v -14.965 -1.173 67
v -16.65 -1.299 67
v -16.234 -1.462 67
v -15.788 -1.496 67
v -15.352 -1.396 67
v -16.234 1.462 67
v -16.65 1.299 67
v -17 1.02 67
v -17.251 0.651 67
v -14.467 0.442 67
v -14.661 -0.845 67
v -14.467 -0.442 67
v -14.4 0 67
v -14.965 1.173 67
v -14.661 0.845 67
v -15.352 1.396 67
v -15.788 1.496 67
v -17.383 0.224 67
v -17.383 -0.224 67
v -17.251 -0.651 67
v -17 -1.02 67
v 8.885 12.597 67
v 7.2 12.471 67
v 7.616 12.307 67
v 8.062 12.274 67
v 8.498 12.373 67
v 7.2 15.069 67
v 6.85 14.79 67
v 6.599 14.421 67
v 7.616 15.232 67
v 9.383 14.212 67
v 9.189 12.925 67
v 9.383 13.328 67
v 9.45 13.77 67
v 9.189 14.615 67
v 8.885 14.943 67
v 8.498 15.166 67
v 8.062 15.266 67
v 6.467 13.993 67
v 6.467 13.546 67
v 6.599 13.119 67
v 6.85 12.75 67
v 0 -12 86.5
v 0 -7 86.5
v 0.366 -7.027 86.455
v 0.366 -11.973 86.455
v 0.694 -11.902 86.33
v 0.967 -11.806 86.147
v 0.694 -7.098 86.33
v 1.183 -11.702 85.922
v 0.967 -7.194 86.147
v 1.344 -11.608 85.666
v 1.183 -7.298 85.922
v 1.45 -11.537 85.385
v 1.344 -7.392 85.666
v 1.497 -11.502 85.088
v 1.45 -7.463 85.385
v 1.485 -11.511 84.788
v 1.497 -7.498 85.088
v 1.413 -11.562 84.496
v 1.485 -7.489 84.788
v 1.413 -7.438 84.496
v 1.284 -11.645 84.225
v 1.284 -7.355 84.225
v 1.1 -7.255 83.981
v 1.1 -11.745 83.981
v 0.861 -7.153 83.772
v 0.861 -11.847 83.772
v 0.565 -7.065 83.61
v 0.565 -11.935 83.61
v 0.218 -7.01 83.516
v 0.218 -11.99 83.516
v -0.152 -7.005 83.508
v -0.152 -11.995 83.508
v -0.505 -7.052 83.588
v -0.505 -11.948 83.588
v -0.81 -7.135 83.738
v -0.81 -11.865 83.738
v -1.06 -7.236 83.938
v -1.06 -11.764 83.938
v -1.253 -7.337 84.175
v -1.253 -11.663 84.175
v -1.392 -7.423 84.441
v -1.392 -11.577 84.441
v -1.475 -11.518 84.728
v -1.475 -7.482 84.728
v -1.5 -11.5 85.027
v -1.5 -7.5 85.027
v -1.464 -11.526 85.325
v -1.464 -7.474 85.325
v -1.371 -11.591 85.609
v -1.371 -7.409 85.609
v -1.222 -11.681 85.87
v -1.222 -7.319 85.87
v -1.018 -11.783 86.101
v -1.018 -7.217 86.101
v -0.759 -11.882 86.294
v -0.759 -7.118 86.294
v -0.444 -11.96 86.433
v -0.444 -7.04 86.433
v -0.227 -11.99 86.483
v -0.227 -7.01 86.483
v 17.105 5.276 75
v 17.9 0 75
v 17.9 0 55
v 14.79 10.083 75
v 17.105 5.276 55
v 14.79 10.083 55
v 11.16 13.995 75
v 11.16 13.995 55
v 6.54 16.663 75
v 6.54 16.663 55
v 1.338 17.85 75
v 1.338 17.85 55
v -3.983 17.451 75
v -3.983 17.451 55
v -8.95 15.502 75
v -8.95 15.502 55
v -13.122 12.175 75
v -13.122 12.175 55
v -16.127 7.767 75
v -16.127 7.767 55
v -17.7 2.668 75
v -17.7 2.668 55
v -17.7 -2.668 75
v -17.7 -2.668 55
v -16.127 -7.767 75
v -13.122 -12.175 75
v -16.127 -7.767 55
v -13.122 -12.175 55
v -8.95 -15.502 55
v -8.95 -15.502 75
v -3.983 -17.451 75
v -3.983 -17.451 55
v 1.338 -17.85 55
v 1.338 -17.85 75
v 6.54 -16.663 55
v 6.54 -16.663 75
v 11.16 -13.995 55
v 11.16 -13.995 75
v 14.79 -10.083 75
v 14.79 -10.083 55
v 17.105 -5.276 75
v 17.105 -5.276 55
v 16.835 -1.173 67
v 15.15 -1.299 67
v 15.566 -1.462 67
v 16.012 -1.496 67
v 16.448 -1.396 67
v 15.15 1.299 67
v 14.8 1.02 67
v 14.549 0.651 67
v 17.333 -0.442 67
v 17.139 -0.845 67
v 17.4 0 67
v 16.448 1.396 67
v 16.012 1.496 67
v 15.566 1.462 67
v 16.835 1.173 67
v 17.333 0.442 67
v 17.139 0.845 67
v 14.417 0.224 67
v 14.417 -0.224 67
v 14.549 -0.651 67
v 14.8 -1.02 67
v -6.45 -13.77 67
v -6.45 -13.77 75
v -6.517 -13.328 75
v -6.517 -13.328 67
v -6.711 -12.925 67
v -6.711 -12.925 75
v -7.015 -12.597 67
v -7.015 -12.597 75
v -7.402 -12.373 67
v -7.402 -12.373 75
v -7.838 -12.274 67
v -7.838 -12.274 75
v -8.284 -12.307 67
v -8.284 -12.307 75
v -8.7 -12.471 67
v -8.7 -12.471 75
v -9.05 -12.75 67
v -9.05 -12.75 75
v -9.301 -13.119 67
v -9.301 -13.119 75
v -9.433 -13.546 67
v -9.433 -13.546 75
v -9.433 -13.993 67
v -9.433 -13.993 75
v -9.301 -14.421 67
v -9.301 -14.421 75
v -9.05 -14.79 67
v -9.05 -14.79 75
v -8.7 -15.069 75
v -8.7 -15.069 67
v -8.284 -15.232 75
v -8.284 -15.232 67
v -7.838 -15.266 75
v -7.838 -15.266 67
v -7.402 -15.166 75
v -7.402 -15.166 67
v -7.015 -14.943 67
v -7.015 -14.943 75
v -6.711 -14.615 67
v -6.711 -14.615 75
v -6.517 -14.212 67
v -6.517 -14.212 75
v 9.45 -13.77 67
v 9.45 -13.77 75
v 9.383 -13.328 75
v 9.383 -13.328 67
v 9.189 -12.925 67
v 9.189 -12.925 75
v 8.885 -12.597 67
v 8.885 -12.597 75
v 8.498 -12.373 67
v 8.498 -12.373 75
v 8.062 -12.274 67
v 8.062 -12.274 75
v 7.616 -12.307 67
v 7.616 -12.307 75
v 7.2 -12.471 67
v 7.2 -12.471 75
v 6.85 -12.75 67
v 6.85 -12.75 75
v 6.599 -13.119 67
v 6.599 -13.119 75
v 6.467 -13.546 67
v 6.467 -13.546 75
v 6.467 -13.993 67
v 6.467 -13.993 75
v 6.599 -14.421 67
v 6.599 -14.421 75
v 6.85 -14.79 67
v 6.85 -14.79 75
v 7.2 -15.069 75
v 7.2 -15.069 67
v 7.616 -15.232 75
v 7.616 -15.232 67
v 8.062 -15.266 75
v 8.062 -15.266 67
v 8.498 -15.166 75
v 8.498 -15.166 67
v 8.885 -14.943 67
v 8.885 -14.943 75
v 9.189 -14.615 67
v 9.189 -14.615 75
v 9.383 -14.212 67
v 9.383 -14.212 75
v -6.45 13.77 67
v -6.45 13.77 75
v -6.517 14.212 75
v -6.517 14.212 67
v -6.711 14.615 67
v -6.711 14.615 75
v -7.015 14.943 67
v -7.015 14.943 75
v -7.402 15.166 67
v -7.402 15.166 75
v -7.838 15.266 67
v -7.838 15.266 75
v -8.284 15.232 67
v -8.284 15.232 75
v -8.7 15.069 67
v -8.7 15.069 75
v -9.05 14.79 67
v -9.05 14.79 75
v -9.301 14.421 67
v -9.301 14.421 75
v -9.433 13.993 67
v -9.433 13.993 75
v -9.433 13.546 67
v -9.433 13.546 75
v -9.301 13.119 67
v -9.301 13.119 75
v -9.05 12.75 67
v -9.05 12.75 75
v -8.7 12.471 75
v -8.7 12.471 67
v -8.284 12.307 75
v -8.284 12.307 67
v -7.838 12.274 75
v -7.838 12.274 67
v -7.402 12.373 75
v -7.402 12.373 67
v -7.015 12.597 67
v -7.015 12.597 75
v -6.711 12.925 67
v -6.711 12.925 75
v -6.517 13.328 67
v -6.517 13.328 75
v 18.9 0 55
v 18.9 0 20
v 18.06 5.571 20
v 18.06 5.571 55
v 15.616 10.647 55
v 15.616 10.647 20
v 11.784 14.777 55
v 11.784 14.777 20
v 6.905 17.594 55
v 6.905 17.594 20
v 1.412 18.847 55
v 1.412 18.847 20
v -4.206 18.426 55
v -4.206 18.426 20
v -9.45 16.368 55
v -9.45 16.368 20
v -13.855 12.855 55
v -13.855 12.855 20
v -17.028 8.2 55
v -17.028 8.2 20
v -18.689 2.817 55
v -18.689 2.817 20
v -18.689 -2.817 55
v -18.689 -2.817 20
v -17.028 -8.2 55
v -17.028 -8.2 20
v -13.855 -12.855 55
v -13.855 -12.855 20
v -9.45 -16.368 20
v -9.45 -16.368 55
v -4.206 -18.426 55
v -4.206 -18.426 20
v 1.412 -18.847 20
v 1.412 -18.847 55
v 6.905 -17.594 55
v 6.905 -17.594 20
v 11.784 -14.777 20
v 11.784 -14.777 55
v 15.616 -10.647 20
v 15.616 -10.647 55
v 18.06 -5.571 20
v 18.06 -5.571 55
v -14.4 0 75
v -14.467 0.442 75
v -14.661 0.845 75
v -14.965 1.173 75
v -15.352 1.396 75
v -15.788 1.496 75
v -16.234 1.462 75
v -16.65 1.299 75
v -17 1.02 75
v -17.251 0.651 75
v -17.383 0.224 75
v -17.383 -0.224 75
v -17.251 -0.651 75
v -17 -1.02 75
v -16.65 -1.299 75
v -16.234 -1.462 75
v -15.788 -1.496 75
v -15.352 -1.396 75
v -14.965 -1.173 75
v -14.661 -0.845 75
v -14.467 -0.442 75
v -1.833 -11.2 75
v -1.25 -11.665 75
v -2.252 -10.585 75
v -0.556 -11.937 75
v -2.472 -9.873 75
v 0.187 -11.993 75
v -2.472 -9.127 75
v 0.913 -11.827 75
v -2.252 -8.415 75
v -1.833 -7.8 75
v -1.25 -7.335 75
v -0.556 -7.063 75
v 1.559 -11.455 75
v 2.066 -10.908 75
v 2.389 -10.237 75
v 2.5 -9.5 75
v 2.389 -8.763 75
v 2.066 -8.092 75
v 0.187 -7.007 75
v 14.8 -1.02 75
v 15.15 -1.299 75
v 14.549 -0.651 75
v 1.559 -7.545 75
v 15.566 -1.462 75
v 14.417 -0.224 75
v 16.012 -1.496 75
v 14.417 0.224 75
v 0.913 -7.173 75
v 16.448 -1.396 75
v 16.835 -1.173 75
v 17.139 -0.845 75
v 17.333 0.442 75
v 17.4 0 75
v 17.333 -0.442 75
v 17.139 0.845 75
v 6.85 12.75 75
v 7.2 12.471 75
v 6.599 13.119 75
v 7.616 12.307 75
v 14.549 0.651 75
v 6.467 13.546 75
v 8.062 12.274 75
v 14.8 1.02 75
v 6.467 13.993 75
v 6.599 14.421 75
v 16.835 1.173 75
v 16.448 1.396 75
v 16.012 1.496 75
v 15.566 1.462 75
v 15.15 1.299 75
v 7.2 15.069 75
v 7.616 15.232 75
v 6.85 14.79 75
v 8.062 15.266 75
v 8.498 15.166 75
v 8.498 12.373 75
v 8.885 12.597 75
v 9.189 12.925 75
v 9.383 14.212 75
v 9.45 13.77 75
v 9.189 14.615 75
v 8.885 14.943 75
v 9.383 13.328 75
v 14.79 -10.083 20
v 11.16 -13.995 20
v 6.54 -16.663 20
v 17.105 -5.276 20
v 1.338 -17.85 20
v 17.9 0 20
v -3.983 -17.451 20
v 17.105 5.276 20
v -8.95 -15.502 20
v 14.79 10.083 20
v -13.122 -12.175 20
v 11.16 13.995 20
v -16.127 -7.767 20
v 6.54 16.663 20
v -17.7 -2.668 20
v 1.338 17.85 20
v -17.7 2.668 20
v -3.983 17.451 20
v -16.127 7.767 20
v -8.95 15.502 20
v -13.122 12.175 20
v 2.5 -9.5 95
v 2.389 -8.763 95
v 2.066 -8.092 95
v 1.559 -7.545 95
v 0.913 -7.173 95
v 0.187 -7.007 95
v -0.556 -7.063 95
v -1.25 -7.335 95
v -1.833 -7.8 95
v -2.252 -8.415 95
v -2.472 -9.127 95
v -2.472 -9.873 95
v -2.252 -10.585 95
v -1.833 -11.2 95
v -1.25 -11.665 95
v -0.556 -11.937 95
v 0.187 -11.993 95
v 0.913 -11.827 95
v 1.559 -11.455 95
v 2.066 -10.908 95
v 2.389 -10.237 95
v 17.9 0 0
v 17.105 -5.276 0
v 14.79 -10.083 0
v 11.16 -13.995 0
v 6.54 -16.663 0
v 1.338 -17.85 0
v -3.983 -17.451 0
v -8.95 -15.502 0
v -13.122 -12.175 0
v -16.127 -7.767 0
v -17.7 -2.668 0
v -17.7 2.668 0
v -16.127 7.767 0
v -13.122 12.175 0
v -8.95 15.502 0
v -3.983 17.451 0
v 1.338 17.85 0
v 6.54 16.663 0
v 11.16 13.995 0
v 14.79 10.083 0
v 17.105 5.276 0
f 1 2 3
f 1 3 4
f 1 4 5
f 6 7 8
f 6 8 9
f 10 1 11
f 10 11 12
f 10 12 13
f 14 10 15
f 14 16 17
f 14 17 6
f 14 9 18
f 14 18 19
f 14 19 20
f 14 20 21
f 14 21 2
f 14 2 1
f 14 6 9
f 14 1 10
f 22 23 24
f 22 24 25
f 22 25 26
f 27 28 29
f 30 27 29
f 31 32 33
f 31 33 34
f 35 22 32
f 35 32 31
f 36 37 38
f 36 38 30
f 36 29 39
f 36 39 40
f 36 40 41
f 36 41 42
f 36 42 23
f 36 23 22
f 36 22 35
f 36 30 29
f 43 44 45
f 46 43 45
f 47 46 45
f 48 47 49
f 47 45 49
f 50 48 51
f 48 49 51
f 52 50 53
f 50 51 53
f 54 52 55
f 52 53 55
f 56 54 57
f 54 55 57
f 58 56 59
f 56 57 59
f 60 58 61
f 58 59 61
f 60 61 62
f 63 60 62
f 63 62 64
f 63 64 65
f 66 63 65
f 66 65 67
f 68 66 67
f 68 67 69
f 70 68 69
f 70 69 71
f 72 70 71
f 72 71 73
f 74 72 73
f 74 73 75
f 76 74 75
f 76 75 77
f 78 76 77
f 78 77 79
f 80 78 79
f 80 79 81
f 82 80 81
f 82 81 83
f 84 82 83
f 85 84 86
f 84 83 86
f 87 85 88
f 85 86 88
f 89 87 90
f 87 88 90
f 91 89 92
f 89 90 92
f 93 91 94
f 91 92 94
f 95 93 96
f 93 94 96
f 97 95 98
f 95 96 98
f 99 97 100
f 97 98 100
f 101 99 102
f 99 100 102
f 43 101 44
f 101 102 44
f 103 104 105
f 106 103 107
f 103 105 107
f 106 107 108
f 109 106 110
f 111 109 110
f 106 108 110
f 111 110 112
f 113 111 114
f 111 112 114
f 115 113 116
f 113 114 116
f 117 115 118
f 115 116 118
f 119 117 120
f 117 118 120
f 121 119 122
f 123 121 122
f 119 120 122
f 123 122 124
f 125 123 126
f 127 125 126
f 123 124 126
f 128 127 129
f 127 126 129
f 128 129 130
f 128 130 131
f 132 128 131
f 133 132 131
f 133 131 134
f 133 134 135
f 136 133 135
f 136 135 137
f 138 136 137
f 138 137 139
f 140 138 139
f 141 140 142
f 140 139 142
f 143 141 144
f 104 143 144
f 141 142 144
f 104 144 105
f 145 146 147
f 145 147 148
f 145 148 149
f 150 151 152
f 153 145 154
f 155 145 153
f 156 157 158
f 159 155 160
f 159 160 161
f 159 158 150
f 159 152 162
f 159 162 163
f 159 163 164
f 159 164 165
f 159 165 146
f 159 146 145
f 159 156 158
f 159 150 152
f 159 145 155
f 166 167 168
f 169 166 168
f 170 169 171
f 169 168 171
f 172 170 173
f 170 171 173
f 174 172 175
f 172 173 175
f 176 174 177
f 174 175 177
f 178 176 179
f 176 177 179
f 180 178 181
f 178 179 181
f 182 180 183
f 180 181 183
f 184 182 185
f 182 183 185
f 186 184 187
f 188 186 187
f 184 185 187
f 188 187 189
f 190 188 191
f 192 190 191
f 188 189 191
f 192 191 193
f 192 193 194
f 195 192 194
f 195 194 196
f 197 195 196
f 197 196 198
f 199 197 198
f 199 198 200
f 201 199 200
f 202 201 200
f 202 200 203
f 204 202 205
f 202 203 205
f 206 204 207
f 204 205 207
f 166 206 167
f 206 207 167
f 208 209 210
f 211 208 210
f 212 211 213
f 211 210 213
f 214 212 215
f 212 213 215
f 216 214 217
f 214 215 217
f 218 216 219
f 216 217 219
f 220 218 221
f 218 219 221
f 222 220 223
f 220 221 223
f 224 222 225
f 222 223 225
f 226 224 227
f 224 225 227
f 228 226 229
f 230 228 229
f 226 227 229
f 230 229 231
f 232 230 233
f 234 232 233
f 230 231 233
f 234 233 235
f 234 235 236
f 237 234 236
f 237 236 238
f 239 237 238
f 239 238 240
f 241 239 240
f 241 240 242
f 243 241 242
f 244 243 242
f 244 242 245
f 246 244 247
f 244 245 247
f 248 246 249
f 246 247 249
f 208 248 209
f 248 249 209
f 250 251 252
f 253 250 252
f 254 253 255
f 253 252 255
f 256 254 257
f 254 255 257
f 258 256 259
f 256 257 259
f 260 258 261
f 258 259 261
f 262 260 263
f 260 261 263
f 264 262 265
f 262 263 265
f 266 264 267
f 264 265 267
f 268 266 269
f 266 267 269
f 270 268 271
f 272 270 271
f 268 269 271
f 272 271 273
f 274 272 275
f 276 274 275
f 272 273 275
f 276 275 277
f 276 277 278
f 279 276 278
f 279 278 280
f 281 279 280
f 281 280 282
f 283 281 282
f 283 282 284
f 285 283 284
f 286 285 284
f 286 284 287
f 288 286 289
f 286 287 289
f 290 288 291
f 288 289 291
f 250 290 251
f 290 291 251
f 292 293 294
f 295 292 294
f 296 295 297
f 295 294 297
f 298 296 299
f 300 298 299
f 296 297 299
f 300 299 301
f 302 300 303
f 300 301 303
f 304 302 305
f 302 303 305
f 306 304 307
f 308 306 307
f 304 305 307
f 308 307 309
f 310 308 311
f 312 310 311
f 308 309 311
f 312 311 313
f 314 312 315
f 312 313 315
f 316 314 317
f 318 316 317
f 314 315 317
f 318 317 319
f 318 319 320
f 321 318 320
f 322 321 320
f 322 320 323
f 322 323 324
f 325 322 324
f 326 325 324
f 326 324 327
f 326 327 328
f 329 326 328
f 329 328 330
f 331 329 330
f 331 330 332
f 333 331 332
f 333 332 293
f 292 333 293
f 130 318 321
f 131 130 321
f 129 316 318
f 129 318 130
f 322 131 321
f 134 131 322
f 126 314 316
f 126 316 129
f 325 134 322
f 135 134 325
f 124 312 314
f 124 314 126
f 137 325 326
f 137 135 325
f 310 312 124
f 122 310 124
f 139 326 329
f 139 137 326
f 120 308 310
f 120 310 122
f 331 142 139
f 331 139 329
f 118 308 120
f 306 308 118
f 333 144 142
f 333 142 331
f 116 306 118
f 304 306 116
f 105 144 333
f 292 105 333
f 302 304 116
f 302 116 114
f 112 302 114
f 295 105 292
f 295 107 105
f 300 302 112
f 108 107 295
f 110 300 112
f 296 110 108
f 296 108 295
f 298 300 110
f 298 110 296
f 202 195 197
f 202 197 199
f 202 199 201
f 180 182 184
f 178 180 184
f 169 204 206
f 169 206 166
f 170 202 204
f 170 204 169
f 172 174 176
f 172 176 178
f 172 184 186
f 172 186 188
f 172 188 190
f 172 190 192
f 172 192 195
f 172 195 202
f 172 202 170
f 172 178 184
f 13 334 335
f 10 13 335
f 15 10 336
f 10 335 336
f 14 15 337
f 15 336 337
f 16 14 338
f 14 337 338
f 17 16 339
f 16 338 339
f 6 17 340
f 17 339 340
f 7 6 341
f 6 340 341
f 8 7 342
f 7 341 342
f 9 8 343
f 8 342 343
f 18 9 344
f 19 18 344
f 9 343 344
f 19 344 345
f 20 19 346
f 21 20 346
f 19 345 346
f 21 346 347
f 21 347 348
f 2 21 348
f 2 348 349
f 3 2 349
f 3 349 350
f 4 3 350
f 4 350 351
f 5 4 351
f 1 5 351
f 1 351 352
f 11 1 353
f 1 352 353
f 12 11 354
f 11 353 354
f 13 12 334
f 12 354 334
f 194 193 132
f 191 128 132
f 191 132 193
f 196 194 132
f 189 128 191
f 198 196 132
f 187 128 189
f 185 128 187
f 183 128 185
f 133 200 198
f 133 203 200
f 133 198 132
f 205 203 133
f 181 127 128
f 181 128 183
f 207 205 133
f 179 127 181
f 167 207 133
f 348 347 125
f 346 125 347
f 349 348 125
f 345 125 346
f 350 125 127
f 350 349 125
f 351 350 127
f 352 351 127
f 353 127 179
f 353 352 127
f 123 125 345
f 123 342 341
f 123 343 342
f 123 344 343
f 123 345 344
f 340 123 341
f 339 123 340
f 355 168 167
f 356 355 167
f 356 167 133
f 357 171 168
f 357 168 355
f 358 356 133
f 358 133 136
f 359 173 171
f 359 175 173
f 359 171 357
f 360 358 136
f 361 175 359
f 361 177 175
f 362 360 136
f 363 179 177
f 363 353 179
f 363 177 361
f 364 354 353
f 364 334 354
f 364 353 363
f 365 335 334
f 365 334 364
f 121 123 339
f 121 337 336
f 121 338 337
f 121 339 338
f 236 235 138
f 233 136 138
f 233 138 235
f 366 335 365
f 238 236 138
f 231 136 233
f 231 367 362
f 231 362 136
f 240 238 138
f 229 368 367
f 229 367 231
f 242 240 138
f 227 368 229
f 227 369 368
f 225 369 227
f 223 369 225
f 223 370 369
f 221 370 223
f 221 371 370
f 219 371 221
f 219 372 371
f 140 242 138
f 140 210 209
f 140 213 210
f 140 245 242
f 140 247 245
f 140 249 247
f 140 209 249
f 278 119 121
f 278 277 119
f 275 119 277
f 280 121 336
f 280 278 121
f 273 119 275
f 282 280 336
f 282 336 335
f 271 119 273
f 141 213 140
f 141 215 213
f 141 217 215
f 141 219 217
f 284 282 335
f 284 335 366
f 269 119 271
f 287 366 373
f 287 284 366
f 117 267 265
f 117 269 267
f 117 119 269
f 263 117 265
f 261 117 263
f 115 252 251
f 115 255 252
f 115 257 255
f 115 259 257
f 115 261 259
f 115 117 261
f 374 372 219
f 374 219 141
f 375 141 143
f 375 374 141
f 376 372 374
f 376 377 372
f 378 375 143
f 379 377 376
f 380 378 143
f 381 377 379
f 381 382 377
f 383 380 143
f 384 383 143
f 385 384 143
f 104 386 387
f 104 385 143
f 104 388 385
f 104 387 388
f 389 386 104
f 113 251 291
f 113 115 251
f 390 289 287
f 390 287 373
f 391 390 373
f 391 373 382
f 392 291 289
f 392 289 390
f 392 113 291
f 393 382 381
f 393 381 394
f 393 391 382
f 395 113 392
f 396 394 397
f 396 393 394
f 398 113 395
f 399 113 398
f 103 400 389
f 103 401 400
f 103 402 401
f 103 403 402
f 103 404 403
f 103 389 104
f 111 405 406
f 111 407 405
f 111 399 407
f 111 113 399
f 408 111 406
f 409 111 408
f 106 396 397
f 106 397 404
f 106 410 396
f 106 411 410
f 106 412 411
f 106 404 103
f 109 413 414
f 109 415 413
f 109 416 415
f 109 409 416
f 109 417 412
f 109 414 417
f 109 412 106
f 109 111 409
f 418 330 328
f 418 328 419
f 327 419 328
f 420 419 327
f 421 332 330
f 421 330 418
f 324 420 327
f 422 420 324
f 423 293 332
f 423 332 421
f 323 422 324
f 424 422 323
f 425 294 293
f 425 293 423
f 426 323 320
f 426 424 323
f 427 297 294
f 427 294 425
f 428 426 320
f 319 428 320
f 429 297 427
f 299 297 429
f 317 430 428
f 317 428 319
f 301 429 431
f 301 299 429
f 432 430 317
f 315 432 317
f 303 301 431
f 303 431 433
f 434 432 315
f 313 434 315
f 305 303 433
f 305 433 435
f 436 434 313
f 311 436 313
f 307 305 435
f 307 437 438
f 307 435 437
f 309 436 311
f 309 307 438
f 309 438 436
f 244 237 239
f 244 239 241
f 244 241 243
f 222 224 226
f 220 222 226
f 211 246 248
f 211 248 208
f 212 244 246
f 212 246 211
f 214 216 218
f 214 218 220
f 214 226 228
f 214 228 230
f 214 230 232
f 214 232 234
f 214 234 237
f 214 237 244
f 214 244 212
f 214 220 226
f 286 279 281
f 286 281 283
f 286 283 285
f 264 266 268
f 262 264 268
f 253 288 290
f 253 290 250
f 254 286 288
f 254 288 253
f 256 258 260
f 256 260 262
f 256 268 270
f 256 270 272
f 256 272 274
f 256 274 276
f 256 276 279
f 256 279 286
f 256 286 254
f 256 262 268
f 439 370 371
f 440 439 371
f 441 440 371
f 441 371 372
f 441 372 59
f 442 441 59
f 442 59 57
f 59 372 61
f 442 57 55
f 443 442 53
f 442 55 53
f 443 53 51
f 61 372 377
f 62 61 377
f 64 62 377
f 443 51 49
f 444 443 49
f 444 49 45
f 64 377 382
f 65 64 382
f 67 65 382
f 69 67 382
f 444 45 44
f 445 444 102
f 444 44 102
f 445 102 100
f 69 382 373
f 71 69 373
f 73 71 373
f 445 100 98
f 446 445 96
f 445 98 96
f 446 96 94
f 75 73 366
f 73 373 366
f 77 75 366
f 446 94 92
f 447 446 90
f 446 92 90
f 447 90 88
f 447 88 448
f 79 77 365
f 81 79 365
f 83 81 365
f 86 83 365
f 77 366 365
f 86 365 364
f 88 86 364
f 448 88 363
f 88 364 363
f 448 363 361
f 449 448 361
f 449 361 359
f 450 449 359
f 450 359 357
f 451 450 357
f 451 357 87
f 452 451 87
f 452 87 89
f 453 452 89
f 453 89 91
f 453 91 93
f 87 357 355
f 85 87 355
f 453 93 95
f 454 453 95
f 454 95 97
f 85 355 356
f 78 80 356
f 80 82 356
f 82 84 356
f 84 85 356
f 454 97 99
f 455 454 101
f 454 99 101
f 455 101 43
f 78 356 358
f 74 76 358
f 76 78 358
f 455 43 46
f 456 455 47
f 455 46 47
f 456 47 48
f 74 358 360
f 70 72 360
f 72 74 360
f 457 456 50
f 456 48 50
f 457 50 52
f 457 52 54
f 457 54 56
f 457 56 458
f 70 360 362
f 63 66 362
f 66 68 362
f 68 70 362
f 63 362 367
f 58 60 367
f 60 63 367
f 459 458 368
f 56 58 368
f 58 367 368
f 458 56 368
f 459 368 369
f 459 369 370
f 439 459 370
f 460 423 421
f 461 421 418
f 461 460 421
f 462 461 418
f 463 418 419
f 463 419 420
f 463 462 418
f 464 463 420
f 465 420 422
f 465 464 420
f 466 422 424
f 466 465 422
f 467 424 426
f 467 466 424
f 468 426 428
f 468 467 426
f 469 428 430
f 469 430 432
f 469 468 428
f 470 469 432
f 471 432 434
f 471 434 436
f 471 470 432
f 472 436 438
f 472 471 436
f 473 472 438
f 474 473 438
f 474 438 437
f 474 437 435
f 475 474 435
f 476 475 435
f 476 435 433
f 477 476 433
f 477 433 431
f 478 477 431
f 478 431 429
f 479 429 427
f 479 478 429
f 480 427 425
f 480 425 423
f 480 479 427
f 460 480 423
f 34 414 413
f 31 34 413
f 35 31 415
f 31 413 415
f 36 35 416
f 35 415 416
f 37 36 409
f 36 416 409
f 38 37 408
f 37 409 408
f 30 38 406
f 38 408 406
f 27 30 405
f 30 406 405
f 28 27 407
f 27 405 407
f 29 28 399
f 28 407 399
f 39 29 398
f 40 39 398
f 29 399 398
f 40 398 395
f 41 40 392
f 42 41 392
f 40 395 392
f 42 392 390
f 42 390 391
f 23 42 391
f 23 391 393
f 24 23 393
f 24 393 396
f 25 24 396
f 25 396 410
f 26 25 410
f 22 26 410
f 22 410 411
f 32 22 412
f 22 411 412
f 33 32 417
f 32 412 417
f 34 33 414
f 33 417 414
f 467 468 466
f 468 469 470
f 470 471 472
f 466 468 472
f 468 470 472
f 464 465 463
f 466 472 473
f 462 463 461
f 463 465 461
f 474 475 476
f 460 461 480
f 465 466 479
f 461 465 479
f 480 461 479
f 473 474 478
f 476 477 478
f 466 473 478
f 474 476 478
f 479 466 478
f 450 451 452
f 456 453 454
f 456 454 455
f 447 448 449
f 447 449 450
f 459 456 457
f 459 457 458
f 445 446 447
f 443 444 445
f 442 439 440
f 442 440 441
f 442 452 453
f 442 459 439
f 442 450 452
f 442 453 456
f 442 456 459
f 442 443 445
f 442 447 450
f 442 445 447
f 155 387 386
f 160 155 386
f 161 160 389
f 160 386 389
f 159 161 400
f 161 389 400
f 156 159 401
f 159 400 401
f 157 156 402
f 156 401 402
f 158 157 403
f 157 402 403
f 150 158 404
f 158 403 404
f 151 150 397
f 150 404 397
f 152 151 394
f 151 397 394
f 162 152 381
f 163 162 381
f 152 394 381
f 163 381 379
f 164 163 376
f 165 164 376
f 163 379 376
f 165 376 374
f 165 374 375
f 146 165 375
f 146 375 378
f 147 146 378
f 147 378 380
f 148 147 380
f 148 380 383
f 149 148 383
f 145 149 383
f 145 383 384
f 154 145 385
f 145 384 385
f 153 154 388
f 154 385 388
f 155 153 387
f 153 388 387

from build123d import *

# Parameters (mm, degrees)
SKETCH1_R           = 18.9
BOSS_EXTRUDE1_DEPTH = 75
SKETCH2_R           = 1.5
CUT_EXTRUDE1_DEPTH  = 8
SKETCH3_R           = 2.5
BOSS_EXTRUDE2_DEPTH = 20
CUT_EXTRUDE4_START  = -20
SKETCH5_R           = 18.9
SKETCH5_R_2         = 17.9
CUT_EXTRUDE4_DEPTH  = 20
SKETCH6_R           = 18.9
SKETCH6_R_2         = 17.9
CUT_EXTRUDE5_DEPTH  = 20
SKETCH7_R           = 1.5
CUT_EXTRUDE6_DEPTH  = 99.688499837


with BuildPart() as part:
    # Sketch1 → Boss-Extrude1 (new body)
    with BuildSketch(Plane.XY):
        Circle(SKETCH1_R)
    extrude(amount=BOSS_EXTRUDE1_DEPTH)

    # Sketch2 → Cut-Extrude1 (cut)
    with BuildSketch(Plane.XY.offset(75)):
        with Locations((15.9, 0)):
            Circle(SKETCH2_R)
        with Locations((7.95, -13.76980392)):
            Circle(SKETCH2_R)
        with Locations((-7.95, -13.76980392)):
            Circle(SKETCH2_R)
        with Locations((-15.9, 0)):
            Circle(SKETCH2_R)
        with Locations((-7.95, 13.76980392)):
            Circle(SKETCH2_R)
        with Locations((7.95, 13.76980392)):
            Circle(SKETCH2_R)
    extrude(amount=-CUT_EXTRUDE1_DEPTH, mode=Mode.SUBTRACT)

    # Sketch3 → Boss-Extrude2 (add)
    with BuildSketch(Plane.XY.offset(75)):
        with Locations((0, -9.5)):
            Circle(SKETCH3_R)
    extrude(amount=BOSS_EXTRUDE2_DEPTH)

    # Sketch5 → Cut-Extrude4 (cut)
    with BuildSketch(Plane.XY.offset(75).offset(CUT_EXTRUDE4_START)):
        Circle(SKETCH5_R)
        Circle(SKETCH5_R_2, mode=Mode.SUBTRACT)
    extrude(amount=CUT_EXTRUDE4_DEPTH, mode=Mode.SUBTRACT)

    # Sketch6 → Cut-Extrude5 (cut)
    with BuildSketch(Plane(origin=(0, 0, 0), x_dir=(-1, 0, 0), z_dir=(0, 0, -1))):
        Circle(SKETCH6_R)
        with Locations(Location((0, 0, 0), (0, 0, 180))):
            Circle(SKETCH6_R_2, mode=Mode.SUBTRACT)
    extrude(amount=-CUT_EXTRUDE5_DEPTH, mode=Mode.SUBTRACT)

    # Sketch7 → Cut-Extrude6 (cut, through all)
    with BuildSketch(Plane(origin=(0, 0, 0), x_dir=(1, 0, 0), z_dir=(0, 1, 0))):
        with Locations(Location((0, -85, 0), (0, 0, 270))):
            Circle(SKETCH7_R)
    extrude(amount=-CUT_EXTRUDE6_DEPTH, mode=Mode.SUBTRACT)


solid = part.part
